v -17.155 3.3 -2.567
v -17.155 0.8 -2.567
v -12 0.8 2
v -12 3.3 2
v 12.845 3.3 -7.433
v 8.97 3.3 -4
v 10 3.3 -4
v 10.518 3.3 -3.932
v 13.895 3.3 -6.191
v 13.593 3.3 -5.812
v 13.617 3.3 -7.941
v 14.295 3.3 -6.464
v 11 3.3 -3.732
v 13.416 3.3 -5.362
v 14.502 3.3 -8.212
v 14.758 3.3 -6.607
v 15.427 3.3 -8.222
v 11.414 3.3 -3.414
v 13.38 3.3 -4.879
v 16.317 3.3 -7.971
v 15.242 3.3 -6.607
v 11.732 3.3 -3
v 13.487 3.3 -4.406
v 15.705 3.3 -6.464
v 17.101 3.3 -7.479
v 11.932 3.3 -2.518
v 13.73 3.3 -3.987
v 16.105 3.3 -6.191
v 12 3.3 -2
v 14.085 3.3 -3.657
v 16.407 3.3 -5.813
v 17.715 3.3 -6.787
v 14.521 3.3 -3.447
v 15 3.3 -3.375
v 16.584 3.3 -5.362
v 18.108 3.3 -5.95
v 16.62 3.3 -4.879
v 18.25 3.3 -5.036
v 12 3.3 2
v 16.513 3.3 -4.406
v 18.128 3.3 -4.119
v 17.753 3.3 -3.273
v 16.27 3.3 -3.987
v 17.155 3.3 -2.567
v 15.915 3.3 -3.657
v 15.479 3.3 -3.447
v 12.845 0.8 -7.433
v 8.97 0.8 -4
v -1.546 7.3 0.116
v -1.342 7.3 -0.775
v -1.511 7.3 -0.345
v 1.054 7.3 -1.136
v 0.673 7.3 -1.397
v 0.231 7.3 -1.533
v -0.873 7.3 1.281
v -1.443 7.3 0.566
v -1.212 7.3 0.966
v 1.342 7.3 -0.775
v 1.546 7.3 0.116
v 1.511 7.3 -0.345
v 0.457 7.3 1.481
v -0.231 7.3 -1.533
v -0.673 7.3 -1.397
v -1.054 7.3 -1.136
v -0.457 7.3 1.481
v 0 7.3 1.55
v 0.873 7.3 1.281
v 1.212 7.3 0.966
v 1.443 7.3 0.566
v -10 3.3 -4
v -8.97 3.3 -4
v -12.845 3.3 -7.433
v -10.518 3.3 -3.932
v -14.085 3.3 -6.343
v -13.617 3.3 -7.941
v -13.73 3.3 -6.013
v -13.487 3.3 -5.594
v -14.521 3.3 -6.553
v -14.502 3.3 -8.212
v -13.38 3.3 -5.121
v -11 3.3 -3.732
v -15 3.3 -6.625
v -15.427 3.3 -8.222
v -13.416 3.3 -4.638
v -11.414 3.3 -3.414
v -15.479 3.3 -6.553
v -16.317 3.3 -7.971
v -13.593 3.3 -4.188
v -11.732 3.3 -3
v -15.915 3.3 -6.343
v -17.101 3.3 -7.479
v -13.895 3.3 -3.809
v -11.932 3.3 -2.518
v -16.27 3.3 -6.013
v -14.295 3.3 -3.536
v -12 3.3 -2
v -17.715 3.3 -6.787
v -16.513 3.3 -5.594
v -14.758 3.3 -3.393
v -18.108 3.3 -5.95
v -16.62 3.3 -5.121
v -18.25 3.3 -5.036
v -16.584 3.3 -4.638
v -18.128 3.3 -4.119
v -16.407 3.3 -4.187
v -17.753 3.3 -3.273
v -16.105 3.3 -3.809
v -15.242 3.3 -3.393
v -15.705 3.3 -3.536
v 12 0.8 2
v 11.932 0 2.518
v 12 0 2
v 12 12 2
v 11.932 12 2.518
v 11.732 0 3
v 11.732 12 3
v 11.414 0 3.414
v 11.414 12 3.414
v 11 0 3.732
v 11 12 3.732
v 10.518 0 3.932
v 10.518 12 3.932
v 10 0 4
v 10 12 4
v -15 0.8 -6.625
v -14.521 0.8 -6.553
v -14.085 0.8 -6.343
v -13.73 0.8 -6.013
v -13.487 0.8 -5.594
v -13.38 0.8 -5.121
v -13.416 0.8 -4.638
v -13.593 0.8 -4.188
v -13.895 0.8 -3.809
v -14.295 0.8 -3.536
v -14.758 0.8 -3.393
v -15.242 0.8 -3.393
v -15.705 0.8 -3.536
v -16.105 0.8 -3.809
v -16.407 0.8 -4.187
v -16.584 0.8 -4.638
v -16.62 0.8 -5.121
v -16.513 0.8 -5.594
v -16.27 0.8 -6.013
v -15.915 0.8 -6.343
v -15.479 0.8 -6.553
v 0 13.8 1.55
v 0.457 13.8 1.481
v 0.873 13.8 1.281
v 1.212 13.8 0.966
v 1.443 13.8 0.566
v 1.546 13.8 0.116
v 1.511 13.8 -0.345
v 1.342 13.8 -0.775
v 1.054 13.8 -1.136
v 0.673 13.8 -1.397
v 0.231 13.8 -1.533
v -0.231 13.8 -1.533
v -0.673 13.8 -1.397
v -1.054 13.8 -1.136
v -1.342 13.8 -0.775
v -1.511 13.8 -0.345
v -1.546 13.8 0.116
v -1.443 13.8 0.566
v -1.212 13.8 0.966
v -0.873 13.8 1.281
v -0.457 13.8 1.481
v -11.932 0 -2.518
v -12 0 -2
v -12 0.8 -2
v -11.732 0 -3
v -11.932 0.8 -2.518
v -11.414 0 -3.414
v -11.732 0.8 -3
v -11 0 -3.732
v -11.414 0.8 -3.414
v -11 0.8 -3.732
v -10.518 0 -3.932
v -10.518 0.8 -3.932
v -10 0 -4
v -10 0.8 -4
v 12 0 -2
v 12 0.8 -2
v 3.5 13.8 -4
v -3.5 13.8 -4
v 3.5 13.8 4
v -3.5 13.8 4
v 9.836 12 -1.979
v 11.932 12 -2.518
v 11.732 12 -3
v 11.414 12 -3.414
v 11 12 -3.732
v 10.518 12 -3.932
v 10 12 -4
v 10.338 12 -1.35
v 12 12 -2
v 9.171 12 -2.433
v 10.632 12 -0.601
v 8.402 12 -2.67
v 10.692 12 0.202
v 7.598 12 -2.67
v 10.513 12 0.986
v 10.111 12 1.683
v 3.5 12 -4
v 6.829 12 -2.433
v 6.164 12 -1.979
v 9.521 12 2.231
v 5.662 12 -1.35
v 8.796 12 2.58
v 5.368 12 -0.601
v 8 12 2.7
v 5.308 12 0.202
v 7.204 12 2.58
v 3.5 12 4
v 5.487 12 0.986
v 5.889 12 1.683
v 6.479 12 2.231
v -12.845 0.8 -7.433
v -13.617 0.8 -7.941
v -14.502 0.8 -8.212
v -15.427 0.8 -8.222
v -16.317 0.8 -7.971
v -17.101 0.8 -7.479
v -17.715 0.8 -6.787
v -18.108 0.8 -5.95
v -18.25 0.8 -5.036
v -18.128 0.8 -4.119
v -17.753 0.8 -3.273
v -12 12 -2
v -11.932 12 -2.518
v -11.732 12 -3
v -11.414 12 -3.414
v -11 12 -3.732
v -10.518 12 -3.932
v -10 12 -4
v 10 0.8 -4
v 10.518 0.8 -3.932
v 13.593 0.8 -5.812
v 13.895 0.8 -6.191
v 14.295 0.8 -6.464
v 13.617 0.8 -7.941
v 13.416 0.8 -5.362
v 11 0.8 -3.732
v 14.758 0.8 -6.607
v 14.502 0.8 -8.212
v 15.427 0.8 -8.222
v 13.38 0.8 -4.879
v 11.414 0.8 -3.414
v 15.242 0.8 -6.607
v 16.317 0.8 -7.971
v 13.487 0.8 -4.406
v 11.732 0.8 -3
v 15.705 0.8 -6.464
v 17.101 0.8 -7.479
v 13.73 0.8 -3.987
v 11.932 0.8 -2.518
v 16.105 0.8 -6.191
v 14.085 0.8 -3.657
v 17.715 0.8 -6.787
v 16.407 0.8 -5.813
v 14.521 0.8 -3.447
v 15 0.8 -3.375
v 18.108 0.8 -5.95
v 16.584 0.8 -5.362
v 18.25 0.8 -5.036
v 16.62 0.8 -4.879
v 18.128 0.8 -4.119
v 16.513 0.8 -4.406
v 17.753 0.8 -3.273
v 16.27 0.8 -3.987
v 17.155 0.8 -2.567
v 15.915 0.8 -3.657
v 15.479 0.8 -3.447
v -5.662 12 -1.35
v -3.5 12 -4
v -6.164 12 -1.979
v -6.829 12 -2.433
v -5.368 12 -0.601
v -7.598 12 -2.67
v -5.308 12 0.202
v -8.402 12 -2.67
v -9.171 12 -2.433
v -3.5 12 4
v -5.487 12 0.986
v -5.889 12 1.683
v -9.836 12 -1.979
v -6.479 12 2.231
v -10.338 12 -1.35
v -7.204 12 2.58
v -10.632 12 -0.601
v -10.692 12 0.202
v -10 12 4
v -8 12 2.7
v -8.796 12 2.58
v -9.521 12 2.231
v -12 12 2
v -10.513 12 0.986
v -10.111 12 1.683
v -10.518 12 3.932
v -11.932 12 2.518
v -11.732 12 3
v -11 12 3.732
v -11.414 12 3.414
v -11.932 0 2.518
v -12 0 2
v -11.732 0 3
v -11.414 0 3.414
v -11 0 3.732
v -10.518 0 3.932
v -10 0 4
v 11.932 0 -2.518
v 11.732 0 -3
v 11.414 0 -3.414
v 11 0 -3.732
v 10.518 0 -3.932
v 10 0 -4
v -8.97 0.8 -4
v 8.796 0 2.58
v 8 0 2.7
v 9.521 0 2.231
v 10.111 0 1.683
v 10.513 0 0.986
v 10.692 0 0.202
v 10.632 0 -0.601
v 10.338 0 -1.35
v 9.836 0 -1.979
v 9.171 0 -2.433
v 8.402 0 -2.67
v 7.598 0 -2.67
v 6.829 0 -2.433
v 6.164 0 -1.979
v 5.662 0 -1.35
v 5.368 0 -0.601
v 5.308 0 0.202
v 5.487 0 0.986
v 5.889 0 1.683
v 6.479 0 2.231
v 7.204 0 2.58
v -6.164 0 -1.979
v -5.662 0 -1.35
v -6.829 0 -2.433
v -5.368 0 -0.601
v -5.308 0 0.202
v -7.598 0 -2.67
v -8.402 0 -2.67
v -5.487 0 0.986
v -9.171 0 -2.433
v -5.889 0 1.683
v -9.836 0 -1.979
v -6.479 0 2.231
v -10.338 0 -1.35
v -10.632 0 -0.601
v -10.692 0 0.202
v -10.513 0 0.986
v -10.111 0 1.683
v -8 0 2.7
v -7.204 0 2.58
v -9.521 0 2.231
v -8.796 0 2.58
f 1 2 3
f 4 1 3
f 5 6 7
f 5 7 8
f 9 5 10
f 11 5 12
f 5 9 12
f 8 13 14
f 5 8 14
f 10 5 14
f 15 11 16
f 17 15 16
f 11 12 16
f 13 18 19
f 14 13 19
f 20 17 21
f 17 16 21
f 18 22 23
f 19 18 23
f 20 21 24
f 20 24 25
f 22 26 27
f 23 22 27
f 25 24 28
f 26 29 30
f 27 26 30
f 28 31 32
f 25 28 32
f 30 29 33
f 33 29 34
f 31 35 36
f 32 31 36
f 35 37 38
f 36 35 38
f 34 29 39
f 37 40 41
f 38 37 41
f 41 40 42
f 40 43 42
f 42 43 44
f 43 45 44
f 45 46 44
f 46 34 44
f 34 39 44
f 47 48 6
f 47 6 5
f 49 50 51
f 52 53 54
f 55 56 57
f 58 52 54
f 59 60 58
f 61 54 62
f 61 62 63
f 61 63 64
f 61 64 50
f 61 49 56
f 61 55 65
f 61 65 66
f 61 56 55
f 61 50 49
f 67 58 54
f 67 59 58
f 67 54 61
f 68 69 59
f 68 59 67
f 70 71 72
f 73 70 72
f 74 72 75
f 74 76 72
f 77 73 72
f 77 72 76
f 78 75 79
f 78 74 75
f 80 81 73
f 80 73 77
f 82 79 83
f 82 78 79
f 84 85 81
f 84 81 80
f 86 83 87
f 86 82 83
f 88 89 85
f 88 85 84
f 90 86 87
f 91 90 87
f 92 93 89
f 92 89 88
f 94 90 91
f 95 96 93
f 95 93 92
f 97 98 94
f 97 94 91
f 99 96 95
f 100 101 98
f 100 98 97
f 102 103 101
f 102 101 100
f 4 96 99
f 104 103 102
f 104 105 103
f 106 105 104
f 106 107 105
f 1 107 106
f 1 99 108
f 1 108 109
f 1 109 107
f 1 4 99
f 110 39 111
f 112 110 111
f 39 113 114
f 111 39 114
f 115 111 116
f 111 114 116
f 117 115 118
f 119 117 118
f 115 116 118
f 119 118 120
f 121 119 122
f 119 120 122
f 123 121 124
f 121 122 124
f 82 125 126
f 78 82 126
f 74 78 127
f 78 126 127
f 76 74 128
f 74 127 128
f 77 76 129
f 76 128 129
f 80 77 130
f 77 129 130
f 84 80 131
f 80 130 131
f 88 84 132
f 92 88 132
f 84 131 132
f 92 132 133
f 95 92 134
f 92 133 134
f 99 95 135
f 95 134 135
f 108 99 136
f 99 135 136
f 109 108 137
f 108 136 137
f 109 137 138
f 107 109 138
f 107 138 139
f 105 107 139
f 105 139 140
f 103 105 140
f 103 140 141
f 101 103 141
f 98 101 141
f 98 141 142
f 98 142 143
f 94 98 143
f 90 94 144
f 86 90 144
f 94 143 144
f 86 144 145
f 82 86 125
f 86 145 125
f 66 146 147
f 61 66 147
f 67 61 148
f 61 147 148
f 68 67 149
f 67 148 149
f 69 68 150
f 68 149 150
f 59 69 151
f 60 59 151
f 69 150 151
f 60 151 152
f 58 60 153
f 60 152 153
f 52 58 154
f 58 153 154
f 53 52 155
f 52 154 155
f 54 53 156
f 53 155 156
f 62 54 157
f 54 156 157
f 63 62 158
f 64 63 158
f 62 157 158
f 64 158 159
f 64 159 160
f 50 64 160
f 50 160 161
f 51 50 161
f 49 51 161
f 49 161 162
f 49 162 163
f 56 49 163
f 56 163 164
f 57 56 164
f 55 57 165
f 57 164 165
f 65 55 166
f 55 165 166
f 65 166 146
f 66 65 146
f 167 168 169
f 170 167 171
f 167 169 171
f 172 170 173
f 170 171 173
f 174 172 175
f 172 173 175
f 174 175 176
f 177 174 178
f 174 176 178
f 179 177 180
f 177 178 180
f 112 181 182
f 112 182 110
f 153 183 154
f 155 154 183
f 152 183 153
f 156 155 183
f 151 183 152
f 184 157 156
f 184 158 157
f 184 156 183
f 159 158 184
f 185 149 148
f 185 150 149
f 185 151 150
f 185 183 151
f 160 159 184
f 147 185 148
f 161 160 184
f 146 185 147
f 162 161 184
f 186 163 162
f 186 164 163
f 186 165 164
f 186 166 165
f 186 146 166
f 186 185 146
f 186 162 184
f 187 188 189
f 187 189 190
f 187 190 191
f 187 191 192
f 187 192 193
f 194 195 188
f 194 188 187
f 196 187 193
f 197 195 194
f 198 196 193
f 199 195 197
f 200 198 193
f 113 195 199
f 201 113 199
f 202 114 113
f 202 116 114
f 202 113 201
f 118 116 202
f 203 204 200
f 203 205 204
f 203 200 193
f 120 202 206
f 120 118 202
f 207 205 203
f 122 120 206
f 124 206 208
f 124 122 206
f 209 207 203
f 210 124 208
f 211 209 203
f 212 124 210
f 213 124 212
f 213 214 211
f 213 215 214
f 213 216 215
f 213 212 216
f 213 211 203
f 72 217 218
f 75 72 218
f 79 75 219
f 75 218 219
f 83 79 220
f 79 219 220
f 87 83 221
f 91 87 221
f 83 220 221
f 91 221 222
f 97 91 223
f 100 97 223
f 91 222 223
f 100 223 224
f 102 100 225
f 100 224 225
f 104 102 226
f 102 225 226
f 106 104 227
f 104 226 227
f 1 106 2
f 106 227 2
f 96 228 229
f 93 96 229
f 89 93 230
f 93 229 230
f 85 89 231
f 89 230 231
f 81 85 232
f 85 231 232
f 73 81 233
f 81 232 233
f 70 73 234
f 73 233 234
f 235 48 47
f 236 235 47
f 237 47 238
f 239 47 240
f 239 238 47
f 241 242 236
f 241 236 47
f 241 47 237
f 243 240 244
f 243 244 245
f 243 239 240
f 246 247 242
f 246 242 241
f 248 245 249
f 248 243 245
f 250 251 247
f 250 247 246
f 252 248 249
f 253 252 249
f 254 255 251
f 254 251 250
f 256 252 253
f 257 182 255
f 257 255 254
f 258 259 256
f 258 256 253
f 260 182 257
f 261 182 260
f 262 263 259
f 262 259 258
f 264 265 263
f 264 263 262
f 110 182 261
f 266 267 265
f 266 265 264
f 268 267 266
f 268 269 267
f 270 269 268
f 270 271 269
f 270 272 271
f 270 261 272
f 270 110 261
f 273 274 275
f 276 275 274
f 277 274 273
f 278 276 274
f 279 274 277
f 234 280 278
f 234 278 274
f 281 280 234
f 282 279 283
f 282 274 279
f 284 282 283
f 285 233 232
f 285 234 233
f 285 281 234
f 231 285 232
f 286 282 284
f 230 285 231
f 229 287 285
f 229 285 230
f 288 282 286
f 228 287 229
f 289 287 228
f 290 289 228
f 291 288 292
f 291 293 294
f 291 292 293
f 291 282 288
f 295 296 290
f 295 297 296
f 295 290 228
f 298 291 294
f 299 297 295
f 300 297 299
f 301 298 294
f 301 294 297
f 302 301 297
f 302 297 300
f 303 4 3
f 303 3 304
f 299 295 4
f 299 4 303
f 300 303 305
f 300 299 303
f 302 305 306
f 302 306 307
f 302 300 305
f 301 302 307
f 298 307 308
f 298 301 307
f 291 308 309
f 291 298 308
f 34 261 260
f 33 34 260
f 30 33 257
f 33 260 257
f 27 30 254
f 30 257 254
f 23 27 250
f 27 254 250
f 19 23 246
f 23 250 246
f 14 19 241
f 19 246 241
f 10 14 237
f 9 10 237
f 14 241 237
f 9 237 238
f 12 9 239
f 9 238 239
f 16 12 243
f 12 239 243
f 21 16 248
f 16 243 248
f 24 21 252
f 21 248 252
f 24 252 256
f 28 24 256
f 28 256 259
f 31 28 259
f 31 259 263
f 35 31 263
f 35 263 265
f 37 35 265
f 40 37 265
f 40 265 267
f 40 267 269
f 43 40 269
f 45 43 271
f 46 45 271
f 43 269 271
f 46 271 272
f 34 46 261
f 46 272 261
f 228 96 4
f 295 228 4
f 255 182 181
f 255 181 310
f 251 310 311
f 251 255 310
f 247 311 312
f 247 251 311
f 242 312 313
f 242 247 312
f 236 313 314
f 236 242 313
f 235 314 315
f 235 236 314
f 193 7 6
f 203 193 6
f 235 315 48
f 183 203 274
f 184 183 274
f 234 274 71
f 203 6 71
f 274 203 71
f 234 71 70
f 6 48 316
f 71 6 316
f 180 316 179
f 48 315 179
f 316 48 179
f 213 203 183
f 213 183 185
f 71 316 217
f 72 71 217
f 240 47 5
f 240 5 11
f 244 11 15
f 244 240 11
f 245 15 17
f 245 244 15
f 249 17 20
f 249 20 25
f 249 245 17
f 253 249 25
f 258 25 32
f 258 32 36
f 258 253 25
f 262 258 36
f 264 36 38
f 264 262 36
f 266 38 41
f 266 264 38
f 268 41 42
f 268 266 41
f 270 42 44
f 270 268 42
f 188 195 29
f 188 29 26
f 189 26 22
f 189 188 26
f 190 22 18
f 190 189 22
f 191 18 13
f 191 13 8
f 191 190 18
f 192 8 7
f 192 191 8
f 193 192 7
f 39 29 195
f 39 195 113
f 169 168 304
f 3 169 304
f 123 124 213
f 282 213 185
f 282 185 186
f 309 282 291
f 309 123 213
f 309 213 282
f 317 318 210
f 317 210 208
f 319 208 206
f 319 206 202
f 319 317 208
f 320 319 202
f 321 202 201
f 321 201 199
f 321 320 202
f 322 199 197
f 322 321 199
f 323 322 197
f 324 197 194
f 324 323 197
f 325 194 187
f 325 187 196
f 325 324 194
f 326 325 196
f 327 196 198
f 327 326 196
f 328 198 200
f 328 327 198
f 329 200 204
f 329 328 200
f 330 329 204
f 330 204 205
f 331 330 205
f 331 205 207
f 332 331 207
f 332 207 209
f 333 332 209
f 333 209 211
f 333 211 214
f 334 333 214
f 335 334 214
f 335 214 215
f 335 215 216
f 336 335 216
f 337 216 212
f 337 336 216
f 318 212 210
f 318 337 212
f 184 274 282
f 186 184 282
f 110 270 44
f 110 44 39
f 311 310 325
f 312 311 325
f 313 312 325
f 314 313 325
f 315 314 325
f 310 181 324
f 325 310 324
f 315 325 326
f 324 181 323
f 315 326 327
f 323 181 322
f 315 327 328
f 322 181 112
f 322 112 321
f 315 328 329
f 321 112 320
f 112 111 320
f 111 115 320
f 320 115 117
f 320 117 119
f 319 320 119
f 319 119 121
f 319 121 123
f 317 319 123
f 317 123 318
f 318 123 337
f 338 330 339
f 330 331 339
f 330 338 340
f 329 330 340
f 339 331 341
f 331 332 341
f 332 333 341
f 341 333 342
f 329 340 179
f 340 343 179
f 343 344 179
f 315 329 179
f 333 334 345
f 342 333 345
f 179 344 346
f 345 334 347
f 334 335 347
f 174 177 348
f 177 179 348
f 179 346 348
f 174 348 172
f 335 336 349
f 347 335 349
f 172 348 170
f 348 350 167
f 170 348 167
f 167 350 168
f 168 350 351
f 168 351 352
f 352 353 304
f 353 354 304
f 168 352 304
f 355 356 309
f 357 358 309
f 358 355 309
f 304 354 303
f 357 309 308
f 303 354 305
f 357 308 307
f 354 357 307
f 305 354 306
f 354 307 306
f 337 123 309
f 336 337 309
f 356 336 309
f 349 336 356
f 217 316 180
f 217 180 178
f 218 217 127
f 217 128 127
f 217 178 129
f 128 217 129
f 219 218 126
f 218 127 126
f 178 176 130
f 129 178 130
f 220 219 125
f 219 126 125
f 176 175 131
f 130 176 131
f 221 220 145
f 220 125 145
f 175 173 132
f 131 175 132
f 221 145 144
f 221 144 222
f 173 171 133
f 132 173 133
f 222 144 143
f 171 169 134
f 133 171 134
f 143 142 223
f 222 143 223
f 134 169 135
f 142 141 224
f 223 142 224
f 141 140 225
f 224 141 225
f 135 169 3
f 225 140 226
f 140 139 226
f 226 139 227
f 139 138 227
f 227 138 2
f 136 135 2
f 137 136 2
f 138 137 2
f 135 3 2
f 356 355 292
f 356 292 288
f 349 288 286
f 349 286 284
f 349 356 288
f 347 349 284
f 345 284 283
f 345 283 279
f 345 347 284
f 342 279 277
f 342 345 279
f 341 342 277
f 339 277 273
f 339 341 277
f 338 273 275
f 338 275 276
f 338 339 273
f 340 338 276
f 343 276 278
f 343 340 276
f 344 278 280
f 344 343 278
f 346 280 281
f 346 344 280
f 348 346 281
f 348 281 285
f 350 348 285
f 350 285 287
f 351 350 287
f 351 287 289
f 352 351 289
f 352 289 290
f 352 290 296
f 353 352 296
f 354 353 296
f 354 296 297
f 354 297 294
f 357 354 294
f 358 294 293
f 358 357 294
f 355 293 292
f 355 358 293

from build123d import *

# Parameters (mm, degrees)
SKETCH25_W          = 7
SKETCH25_H          = 8
BOSS_EXTRUDE5_DEPTH = 13.8
SKETCH26_W          = 24
SKETCH26_H          = 8
SKETCH26_R          = 2.7
BOSS_EXTRUDE6_DEPTH = 12
FILLET1_R           = 2
SKETCH27_R          = 1.55
CUT_EXTRUDE1_DEPTH  = 6.5
SKETCH29_R          = 1.625
BOSS_EXTRUDE8_DEPTH = 2.5


with BuildPart() as part:
    # Sketch25 → Boss-Extrude5 (new body)
    with BuildSketch(Plane(origin=(0, 0, 0), x_dir=(-1, 0, 0), z_dir=(0, 1, 0))):
        Rectangle(SKETCH25_W, SKETCH25_H)
    extrude(amount=BOSS_EXTRUDE5_DEPTH)

    # Sketch26 → Boss-Extrude6 (add)
    with BuildSketch(Plane(origin=(0, 0, 0), x_dir=(-1, 0, 0), z_dir=(0, 1, 0))):
        Rectangle(SKETCH26_W, SKETCH26_H)
        with Locations((-8, 0)):
            Circle(SKETCH26_R, mode=Mode.SUBTRACT)
        with Locations((8, 0)):
            Circle(SKETCH26_R, mode=Mode.SUBTRACT)
    extrude(amount=BOSS_EXTRUDE6_DEPTH)

    # Fillet1
    fillet1_edges = [part.edges().sort_by_distance(p)[0] for p in [
        (12, 6, -4),
        (-12, 6, -4),
        (-12, 6, 4),
        (12, 6, 4),
    ]]
    fillet(fillet1_edges, radius=FILLET1_R)

    # Sketch27 → Cut-Extrude1 (cut)
    with BuildSketch(Plane(origin=(0, 13.8, 0), x_dir=(1, 0, 0), z_dir=(0, 1, 0))):
        Circle(SKETCH27_R)
    extrude(amount=-CUT_EXTRUDE1_DEPTH, mode=Mode.SUBTRACT)

    # Sketch29 → Boss-Extrude8 (add)
    # profile 1 of 2: a face of its own
    with BuildSketch(Plane.XZ.offset(-0.8)):
        with BuildLine():
            Line((-17.155221844, -2.567404924), (-12, 2))
            Line((-12, 2), (-11, -3))
            Line((-11, -3), (-8.970414177, -4))
            Line((-8.970414177, -4), (-12.844778156, -7.432595076))
            ThreePointArc((-12.844778156, -7.432595076), (-17.432595076, -7.155221844), (-17.155221844, -2.567404924))
        make_face()
        with Locations((-15, -5)):
            Circle(SKETCH29_R, mode=Mode.SUBTRACT)
    # profile 2 of 2: a face of its own
    with BuildSketch(Plane.XZ.offset(-0.8)):
        with BuildLine():
            Line((17.155221844, -2.567404924), (12, 2))
            Line((12, 2), (11, -3))
            Line((11, -3), (8.970414177, -4))
            Line((8.970414177, -4), (12.844778156, -7.432595076))
            ThreePointArc((12.844778156, -7.432595076), (17.432595076, -7.155221844), (17.155221844, -2.567404924))
        make_face()
        with Locations((15, -5)):
            Circle(SKETCH29_R, mode=Mode.SUBTRACT)
    extrude(amount=-BOSS_EXTRUDE8_DEPTH)


solid = part.part
